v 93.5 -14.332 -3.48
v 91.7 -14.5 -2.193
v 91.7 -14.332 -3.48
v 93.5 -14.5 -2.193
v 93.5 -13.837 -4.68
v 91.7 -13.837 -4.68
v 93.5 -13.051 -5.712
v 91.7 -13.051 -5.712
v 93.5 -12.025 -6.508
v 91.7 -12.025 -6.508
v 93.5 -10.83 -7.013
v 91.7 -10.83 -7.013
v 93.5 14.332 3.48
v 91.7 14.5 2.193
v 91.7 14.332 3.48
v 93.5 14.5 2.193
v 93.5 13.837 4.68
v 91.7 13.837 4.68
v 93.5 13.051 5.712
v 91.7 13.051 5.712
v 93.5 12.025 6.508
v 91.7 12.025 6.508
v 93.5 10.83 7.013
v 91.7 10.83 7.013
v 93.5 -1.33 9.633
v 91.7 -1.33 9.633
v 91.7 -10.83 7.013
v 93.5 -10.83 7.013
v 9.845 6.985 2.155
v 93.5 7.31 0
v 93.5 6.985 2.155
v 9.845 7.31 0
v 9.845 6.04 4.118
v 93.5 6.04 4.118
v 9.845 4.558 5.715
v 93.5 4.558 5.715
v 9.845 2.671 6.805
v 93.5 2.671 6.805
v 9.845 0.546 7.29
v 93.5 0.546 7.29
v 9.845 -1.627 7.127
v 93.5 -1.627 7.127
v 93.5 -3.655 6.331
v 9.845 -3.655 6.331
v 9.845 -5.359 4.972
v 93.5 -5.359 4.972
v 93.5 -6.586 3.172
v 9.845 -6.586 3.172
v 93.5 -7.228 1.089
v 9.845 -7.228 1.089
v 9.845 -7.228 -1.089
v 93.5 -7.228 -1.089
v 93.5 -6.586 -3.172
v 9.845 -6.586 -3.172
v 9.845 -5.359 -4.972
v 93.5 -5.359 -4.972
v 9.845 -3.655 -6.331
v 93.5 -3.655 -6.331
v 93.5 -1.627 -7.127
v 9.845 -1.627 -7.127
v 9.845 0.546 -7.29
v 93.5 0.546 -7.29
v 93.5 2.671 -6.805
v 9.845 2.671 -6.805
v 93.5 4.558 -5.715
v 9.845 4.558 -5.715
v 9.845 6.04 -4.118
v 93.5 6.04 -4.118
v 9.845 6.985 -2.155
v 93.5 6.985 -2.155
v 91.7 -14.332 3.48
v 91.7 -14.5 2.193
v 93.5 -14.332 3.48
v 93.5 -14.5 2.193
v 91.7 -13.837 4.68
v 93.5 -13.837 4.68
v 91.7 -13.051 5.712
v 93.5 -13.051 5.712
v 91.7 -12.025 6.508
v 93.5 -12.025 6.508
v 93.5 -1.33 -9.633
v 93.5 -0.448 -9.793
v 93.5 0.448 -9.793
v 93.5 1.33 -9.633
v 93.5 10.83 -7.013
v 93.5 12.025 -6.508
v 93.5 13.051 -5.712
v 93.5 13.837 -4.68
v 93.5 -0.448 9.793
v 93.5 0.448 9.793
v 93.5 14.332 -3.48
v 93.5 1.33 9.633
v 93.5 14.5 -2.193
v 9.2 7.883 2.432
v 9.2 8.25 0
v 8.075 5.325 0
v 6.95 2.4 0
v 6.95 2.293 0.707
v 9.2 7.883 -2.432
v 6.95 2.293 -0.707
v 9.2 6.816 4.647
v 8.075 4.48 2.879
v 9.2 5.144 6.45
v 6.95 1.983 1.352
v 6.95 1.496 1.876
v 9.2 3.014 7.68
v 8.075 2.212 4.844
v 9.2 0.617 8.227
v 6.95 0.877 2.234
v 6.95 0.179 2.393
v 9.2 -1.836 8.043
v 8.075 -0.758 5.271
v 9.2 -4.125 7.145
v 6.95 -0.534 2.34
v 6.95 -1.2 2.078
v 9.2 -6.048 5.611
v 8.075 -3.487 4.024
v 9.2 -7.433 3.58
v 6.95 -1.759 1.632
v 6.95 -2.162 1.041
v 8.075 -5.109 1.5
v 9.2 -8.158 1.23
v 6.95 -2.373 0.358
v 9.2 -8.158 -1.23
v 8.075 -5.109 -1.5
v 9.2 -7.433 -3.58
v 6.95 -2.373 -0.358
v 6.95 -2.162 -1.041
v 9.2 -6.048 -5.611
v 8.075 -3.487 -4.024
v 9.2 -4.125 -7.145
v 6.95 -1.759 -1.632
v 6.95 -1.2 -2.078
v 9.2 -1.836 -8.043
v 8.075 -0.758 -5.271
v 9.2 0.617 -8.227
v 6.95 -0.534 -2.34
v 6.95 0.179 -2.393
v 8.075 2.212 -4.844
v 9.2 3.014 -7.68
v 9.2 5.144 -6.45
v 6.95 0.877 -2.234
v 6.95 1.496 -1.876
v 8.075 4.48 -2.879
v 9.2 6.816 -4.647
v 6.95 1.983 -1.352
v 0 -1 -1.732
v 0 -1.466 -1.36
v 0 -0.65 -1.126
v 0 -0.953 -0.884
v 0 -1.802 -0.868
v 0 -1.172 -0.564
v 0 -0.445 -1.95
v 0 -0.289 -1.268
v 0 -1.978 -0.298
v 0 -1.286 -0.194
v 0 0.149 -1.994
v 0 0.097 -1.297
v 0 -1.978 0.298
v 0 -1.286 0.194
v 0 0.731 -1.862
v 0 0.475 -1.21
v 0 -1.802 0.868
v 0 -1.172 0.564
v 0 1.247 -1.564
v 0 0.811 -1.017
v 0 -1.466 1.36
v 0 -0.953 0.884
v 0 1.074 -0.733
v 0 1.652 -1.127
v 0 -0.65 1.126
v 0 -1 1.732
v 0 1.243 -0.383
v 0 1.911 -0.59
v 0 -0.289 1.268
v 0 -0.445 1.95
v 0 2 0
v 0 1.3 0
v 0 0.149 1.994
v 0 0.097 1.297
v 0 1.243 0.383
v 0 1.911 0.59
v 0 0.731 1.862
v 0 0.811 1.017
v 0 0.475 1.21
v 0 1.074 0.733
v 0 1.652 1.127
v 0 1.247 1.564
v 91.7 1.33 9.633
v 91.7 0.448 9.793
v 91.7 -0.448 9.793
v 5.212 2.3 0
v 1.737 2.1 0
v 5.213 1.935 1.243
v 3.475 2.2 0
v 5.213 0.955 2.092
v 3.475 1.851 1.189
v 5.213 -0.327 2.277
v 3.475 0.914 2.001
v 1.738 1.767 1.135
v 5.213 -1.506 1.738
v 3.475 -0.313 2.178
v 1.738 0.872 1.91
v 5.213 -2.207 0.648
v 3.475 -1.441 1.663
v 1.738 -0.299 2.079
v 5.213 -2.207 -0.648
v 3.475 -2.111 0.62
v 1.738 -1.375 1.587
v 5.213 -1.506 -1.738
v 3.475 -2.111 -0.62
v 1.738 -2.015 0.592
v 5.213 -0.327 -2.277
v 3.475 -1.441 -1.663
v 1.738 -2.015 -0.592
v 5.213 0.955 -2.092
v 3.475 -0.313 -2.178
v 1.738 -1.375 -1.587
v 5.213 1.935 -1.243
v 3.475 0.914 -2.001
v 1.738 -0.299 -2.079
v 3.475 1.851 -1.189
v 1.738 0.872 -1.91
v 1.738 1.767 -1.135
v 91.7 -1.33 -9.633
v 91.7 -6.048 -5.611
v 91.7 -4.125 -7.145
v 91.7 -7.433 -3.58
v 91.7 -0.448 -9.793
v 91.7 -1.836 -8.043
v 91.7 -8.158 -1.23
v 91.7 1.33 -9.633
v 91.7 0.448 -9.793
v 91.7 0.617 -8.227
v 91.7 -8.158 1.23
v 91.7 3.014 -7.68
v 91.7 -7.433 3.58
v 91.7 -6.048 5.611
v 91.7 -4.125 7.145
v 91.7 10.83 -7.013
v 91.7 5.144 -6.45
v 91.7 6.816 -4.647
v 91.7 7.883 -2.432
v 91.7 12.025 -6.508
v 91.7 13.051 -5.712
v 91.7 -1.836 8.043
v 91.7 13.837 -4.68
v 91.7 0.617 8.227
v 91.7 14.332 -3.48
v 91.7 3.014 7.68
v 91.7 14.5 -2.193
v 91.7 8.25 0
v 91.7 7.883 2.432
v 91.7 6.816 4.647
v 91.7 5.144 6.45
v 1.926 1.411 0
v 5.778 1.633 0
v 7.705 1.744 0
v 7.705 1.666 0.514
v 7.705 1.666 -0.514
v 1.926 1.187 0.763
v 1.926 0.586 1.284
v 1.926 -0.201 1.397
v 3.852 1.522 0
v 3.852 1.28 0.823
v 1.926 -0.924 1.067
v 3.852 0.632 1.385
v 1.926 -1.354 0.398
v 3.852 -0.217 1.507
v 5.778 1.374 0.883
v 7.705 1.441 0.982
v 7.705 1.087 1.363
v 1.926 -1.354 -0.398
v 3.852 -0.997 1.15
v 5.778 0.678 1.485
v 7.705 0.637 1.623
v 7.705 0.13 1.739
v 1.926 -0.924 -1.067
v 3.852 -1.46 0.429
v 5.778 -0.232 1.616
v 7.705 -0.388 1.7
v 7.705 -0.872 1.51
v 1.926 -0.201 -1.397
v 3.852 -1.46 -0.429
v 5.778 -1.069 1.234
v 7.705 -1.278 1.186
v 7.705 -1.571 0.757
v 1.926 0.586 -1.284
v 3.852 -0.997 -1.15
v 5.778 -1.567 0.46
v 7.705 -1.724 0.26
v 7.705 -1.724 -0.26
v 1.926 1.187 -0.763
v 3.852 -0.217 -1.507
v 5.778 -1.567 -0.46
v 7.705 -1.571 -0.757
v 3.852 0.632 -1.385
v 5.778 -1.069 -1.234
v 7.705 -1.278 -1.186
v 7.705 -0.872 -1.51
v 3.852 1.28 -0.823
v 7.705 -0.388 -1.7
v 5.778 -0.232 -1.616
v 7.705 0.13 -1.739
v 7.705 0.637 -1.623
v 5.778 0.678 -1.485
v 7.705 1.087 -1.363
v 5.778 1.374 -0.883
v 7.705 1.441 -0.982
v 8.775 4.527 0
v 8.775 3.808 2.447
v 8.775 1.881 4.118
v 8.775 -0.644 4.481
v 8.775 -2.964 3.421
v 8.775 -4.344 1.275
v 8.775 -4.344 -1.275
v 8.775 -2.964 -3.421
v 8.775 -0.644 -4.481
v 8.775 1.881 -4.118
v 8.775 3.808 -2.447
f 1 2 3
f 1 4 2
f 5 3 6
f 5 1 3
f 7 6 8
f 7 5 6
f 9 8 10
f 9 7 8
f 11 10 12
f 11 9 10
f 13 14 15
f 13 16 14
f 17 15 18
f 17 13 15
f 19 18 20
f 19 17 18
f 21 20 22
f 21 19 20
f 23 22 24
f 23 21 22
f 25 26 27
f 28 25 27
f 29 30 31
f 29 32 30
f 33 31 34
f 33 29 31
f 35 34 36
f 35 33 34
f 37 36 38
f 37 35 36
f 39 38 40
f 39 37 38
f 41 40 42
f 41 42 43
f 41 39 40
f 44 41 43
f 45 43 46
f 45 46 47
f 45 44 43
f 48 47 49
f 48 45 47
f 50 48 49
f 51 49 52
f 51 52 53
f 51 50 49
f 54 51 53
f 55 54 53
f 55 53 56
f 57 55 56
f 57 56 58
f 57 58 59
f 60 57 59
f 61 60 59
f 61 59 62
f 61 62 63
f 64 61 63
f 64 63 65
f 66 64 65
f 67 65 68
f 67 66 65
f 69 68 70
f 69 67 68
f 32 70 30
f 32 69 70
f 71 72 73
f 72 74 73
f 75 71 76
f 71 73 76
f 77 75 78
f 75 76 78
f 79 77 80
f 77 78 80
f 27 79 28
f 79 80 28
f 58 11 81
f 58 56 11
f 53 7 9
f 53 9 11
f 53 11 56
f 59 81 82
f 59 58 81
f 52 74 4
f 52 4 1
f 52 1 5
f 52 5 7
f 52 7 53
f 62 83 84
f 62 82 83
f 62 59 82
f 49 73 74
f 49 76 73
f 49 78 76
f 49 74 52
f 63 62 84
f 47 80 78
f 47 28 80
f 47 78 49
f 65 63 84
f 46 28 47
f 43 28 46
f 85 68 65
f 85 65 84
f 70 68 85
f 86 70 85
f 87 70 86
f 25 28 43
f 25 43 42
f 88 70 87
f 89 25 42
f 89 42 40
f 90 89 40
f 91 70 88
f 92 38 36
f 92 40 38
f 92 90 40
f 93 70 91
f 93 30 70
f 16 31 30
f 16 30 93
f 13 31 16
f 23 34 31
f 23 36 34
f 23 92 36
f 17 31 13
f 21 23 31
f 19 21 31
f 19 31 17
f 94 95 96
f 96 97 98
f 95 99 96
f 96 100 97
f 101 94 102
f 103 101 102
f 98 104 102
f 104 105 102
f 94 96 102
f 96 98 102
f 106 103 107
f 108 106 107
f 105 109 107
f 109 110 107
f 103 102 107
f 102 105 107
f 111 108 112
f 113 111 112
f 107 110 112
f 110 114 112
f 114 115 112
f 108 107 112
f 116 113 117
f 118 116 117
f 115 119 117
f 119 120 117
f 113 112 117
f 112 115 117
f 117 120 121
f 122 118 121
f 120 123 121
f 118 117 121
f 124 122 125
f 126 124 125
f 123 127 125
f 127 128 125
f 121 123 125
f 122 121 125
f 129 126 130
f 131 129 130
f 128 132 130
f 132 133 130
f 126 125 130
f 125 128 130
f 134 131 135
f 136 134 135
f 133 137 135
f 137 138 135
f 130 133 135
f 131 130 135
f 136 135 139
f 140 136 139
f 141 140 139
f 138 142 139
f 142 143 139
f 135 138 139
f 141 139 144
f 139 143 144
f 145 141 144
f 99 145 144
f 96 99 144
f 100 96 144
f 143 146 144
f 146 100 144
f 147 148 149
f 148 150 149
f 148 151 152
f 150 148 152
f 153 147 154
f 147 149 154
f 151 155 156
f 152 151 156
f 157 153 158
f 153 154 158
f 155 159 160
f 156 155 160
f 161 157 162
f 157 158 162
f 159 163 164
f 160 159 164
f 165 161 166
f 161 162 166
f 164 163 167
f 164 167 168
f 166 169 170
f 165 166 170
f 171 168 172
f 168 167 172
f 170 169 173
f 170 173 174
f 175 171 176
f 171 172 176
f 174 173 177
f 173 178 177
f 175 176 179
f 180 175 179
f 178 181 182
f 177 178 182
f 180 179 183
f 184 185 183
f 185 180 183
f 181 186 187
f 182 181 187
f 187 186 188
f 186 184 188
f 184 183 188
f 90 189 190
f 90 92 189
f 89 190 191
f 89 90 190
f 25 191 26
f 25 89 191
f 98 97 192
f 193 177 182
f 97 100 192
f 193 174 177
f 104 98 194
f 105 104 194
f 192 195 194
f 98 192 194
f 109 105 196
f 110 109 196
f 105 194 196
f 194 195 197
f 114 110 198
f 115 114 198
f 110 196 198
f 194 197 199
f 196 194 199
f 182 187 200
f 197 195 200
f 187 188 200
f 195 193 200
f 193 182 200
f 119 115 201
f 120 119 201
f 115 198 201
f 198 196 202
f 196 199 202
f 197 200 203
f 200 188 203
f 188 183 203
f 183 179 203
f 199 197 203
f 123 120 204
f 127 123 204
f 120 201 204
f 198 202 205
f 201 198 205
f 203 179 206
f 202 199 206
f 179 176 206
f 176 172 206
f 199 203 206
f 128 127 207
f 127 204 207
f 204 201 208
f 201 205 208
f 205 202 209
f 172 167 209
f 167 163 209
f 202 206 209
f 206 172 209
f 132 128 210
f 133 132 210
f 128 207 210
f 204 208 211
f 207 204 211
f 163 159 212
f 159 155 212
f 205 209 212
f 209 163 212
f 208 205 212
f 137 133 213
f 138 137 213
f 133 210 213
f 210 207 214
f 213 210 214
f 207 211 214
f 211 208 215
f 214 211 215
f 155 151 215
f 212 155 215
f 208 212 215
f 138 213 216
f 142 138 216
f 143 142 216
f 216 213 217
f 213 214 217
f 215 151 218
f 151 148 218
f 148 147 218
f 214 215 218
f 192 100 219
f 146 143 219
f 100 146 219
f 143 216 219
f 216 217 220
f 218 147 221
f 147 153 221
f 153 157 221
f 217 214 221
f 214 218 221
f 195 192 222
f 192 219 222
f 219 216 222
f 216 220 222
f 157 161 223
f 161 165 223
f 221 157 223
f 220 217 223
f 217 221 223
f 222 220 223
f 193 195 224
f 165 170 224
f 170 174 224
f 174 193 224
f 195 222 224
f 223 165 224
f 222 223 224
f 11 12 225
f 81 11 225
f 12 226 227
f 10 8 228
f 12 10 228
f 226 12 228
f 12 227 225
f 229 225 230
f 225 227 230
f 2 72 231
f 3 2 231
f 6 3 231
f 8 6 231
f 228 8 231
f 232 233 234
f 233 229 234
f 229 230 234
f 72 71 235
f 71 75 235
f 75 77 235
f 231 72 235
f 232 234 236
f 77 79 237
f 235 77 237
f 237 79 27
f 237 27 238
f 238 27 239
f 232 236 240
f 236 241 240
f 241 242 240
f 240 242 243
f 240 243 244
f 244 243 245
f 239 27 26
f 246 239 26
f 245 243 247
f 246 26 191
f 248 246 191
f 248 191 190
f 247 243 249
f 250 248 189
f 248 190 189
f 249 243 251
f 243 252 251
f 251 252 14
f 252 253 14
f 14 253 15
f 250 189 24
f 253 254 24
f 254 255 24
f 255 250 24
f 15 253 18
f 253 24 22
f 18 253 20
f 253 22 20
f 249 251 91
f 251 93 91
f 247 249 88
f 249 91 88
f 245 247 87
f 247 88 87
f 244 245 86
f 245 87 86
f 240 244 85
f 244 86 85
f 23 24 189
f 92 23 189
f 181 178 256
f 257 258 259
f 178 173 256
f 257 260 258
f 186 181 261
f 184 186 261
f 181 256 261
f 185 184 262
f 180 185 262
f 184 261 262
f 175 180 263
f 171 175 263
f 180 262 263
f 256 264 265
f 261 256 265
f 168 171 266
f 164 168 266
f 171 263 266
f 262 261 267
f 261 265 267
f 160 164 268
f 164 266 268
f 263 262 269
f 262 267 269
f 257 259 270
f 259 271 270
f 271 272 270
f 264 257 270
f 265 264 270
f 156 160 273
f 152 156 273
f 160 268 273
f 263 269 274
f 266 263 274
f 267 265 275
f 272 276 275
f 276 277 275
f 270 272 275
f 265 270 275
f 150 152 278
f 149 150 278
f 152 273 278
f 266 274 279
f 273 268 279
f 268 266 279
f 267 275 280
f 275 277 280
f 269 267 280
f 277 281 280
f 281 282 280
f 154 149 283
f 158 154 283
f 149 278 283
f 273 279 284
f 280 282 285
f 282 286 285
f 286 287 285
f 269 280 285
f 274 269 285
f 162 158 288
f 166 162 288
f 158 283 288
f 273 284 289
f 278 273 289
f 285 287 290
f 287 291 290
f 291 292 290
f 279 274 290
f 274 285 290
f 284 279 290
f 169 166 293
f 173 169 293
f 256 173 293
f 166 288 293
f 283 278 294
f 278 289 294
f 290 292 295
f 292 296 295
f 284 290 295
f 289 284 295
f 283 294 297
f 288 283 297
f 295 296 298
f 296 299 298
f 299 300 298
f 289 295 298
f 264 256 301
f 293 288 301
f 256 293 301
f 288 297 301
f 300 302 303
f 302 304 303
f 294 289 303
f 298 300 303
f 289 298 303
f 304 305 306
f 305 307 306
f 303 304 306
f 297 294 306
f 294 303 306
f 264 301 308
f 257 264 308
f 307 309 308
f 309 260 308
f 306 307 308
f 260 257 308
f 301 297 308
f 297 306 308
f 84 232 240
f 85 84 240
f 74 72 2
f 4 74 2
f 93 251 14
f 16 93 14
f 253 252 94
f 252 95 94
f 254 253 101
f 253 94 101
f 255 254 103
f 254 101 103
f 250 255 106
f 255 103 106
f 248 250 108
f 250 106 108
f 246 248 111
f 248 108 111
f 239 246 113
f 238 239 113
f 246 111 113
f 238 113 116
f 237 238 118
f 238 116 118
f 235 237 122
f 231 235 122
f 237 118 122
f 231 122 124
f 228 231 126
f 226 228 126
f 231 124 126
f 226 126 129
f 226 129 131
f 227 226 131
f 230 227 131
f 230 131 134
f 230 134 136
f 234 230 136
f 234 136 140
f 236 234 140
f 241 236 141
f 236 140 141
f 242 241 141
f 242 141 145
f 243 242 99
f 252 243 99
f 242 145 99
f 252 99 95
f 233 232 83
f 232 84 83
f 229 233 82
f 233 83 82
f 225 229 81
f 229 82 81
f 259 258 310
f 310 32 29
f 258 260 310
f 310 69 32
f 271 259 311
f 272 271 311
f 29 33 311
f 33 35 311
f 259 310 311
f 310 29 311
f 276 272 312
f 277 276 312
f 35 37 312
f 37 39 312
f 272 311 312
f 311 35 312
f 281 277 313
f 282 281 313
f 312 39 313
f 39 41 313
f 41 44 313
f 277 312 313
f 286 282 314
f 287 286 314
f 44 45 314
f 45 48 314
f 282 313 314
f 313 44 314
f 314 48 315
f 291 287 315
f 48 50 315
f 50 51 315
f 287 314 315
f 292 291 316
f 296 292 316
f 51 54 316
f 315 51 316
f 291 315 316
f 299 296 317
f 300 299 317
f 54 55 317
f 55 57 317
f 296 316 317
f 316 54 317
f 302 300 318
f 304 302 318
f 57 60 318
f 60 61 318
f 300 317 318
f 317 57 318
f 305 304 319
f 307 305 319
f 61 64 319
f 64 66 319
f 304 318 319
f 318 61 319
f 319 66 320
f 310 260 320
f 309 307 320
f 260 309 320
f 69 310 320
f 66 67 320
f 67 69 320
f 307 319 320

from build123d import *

# Parameters (mm, degrees)
F2_R     = 7.31
F3_DEPTH = 1.8
F4_R     = 5


with BuildPart() as f1:
    # F0 (on Top) → F1 (revolve)
    with BuildSketch(Plane.XY):
        Polygon((91.7, 8.25), (9.2, 8.25), (6.95, 2.4), (0, 2), (0, 1.300344), (7.704519, 1.74377), (9.845377, 7.31), (91.7, 7.31), align=None)
    revolve(axis=Axis((40.51489, 0, 0), (1, 0, 0)))

    # F2 (on face) → F3 (join)
    with BuildSketch(Plane.YZ.offset(91.7)):
        Polygon((-14.5, 6), (-14.5, 0), (-14.5, -6), (0, -10), (14.5, -6), (14.5, 0), (14.5, 6), (0, 10), align=None)
        Circle(F2_R, mode=Mode.SUBTRACT)
    extrude(amount=F3_DEPTH)

    # F4
    f4_edges = [f1.edges().sort_by_distance(p)[0] for p in [
        (92.6, -14.5, 6),
        (92.6, -14.5, -6),
        (92.6, 0, -10),
        (92.6, 14.5, -6),
        (92.6, 14.5, 6),
        (92.6, 0, 10),
    ]]
    fillet(f4_edges, radius=F4_R)


solid = f1.part
